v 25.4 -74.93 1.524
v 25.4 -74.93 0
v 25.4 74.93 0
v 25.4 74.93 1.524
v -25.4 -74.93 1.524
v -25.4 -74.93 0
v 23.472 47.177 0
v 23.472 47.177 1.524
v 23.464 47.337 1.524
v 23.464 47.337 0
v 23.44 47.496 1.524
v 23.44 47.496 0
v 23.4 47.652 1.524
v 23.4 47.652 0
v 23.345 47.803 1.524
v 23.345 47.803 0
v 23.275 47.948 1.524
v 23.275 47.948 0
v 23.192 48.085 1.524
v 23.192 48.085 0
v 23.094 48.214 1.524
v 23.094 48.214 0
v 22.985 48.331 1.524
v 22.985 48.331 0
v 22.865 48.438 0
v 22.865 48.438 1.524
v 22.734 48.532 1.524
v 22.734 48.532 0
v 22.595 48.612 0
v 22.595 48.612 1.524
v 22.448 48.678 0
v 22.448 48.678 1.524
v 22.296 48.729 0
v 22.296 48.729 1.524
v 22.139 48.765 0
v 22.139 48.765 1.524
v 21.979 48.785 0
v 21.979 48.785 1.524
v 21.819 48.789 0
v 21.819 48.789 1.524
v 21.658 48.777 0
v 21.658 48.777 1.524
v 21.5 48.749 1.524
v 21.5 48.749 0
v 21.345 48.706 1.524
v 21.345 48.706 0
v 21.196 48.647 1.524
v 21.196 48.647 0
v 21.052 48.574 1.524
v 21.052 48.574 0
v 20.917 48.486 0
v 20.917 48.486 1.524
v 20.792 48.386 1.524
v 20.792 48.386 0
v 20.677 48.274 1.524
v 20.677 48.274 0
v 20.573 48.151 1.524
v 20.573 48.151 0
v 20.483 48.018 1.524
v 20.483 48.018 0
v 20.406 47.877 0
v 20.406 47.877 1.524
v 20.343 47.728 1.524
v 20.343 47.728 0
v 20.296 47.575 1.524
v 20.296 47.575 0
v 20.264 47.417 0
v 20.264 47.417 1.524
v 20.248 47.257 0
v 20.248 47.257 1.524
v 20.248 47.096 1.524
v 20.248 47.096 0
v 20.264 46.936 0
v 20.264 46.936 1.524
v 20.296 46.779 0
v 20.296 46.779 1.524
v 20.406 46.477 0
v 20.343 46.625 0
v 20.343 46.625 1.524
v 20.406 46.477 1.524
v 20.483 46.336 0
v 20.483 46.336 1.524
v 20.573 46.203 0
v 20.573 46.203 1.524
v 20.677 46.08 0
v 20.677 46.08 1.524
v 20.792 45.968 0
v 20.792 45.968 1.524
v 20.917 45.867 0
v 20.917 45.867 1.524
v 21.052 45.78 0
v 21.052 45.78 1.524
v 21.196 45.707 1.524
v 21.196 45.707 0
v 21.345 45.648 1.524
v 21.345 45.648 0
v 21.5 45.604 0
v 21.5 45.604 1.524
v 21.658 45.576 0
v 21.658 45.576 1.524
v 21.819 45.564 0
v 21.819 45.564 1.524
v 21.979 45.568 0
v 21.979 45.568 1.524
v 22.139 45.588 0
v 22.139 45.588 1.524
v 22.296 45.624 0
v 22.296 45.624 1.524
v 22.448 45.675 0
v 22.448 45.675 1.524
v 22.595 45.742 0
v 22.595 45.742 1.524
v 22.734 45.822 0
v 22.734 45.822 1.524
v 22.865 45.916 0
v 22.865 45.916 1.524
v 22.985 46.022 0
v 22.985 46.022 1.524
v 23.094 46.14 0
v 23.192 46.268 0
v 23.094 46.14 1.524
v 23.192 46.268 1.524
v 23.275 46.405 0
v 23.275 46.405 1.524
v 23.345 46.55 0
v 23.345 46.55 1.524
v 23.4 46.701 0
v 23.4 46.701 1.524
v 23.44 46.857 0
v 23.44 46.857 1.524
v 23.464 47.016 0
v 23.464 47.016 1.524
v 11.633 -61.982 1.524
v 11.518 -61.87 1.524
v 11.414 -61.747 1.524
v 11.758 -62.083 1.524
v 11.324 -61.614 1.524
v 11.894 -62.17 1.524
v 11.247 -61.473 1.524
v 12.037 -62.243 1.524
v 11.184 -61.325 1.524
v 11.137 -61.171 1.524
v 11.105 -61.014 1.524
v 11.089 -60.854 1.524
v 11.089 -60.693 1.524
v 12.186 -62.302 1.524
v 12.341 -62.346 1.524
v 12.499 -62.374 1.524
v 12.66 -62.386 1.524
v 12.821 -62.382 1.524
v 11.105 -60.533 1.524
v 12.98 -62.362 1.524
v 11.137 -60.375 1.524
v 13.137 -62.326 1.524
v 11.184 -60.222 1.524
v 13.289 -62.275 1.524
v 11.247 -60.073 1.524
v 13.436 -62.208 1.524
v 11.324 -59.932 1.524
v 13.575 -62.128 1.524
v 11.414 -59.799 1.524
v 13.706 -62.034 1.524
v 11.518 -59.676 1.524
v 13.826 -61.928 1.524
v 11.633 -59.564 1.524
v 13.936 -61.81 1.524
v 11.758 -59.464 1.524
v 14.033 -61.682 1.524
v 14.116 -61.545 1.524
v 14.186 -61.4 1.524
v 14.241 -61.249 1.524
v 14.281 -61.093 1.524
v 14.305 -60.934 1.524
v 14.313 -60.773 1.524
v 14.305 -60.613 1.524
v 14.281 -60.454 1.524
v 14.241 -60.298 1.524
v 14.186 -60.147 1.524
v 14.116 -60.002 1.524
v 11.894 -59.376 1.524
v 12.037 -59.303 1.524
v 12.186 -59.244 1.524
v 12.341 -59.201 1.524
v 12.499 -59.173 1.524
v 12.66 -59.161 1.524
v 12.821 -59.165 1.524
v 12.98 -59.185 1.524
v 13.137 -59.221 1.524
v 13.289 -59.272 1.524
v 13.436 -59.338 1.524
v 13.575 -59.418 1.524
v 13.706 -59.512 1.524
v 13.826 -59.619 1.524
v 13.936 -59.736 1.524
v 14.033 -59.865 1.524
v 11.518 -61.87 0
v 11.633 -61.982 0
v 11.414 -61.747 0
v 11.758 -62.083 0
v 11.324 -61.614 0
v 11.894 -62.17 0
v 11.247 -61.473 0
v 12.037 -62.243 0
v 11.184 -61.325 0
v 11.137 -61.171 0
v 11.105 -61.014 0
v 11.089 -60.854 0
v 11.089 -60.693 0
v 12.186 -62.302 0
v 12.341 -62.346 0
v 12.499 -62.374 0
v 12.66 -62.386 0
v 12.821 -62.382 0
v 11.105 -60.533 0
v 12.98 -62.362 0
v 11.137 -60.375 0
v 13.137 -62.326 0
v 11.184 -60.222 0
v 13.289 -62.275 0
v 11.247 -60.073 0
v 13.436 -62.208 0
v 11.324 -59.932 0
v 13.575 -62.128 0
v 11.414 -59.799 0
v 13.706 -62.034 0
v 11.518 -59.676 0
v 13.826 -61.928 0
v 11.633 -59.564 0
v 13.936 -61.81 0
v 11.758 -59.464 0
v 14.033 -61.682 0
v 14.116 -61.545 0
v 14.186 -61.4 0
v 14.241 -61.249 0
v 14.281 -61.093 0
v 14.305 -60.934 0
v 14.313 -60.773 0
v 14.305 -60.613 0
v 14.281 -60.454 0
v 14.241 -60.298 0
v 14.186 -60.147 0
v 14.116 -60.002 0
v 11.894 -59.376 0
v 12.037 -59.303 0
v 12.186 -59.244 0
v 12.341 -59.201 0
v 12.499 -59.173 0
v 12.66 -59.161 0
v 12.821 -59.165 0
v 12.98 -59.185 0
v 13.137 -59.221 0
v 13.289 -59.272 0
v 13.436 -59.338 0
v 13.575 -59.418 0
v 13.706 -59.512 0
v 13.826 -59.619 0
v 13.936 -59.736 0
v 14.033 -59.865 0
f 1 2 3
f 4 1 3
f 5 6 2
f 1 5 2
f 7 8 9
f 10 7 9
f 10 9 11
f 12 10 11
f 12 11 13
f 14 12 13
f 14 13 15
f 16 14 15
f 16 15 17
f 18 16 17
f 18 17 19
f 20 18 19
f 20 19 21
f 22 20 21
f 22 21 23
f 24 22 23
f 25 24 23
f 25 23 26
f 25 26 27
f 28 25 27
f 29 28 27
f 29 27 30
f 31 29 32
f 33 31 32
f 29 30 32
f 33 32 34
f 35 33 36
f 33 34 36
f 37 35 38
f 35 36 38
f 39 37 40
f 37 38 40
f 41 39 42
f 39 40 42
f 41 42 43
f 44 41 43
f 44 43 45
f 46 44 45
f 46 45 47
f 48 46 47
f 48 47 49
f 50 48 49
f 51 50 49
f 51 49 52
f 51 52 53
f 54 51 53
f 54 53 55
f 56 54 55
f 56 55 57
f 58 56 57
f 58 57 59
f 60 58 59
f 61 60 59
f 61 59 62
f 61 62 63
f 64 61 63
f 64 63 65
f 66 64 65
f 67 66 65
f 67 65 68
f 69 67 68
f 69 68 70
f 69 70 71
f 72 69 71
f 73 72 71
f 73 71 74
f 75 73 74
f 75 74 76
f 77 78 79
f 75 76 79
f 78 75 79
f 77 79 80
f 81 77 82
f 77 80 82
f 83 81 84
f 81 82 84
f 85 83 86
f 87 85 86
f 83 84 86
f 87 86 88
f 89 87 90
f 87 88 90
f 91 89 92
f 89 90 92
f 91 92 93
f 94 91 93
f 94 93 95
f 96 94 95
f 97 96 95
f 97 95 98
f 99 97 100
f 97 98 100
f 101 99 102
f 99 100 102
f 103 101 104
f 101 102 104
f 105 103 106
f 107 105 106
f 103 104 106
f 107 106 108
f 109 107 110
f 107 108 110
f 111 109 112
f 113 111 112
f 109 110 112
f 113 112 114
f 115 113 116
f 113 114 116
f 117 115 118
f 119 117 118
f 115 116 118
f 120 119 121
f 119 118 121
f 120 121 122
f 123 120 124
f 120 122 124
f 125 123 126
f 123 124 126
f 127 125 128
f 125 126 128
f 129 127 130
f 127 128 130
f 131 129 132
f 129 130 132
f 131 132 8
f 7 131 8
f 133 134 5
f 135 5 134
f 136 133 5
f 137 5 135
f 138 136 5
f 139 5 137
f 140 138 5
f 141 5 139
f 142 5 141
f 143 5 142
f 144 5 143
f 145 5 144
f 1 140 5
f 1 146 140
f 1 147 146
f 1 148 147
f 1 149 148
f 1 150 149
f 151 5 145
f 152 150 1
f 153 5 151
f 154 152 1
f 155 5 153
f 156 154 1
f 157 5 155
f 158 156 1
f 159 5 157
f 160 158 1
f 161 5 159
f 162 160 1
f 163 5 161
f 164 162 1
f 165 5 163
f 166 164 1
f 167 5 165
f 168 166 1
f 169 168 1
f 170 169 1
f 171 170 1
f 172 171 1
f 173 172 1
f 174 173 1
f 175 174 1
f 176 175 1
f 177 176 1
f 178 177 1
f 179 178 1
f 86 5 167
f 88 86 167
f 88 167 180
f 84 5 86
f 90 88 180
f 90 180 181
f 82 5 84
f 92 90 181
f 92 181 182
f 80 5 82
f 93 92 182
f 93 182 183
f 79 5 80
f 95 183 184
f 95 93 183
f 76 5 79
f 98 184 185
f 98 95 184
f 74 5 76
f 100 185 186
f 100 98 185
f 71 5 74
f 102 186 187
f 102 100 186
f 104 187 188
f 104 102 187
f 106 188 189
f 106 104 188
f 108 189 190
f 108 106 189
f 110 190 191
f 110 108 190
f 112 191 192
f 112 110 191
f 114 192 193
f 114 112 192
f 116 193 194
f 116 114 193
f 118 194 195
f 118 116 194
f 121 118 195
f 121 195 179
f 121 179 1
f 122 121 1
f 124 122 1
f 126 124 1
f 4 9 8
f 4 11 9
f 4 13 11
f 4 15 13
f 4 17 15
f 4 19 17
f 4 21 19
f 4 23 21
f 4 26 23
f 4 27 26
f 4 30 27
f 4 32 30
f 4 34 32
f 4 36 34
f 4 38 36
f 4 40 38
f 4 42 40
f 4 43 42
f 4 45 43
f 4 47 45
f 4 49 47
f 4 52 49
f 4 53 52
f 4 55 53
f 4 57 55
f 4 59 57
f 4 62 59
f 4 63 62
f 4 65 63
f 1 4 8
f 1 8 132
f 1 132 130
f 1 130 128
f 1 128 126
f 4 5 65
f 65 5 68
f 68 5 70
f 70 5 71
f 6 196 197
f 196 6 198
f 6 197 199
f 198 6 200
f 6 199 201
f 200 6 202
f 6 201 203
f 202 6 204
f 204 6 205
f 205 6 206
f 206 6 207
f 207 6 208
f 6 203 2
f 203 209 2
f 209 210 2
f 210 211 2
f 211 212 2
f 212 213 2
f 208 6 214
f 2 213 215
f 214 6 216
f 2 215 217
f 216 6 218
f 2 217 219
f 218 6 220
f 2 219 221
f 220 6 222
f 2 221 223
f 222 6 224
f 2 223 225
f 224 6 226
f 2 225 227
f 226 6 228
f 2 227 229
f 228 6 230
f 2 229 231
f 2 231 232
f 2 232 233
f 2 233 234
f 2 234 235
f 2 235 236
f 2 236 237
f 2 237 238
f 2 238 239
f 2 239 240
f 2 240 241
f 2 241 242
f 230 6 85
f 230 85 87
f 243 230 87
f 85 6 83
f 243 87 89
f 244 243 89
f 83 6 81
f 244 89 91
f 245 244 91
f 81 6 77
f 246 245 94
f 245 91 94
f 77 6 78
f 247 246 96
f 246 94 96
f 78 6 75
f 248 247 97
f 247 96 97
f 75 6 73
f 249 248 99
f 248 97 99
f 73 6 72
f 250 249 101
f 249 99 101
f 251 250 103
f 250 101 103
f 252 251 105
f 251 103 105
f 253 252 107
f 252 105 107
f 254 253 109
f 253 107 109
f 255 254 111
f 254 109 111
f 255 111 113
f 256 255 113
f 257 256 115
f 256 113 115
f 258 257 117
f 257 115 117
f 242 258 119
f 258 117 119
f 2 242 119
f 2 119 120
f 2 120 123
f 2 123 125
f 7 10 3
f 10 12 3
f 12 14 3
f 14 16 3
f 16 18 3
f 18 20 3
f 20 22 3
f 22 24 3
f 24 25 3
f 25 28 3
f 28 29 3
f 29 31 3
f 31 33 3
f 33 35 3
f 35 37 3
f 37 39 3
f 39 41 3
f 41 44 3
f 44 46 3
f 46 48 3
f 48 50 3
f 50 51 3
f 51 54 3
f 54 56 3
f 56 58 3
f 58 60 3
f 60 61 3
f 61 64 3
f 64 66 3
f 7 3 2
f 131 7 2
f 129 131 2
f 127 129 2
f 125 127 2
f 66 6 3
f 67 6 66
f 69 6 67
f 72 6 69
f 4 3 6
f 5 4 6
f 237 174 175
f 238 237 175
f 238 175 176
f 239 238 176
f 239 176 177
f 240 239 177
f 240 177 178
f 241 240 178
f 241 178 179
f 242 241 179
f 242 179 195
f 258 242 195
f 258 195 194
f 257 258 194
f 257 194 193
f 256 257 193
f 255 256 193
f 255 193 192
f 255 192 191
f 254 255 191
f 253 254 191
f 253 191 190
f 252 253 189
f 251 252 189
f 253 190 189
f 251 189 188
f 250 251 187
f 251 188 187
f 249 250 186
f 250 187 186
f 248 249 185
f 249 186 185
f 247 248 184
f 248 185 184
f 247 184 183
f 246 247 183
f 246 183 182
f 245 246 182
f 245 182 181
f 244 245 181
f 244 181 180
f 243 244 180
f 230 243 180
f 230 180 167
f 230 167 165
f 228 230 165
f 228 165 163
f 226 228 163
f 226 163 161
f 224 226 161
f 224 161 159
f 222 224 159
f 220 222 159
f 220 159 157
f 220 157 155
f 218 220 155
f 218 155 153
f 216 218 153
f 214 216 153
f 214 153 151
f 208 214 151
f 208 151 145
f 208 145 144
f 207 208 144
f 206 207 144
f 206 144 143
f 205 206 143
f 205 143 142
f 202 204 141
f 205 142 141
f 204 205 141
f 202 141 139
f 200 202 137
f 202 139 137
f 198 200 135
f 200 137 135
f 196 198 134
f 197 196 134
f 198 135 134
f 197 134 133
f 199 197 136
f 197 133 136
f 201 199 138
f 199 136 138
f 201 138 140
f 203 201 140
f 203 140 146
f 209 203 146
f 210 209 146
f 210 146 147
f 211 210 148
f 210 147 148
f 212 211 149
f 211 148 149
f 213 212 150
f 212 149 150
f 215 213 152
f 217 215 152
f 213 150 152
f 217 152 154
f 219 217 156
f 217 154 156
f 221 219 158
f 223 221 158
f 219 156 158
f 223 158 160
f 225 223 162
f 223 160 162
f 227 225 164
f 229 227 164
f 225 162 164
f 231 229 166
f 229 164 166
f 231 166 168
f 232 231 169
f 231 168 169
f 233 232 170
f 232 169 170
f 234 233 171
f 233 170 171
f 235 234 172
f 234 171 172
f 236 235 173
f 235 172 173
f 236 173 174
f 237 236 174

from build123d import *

# Parameters (mm, degrees)
F1_DEPTH = 1.524
F2_R     = 1.6129
F3_DEPTH = 25.4
F4_DEPTH = 39.37


with BuildPart() as f1:
    # F0 (on Top) → F1 (new body)
    with BuildSketch(Plane.XY):
        Polygon((-25.4, -74.93), (25.4, -74.93), (25.4, 74.93), align=None)
    extrude(amount=F1_DEPTH)

    # F2 (on face) → F3 (cut)
    with BuildSketch(Plane.XY.offset(1.524)):
        with Locations((21.858884, 47.176842)):
            Circle(F2_R)
        with Locations((12.7, -60.773158)):
            Circle(F2_R)
    extrude(amount=-F3_DEPTH, mode=Mode.SUBTRACT)

    # F2 (on face) → F4 (cut)
    with BuildSketch(Plane.XY.offset(1.524)):
        with Locations((21.858884, 47.176842)):
            Circle(F2_R)
        with Locations((12.7, -60.773158)):
            Circle(F2_R)
    extrude(amount=F4_DEPTH, mode=Mode.SUBTRACT)


solid = f1.part
